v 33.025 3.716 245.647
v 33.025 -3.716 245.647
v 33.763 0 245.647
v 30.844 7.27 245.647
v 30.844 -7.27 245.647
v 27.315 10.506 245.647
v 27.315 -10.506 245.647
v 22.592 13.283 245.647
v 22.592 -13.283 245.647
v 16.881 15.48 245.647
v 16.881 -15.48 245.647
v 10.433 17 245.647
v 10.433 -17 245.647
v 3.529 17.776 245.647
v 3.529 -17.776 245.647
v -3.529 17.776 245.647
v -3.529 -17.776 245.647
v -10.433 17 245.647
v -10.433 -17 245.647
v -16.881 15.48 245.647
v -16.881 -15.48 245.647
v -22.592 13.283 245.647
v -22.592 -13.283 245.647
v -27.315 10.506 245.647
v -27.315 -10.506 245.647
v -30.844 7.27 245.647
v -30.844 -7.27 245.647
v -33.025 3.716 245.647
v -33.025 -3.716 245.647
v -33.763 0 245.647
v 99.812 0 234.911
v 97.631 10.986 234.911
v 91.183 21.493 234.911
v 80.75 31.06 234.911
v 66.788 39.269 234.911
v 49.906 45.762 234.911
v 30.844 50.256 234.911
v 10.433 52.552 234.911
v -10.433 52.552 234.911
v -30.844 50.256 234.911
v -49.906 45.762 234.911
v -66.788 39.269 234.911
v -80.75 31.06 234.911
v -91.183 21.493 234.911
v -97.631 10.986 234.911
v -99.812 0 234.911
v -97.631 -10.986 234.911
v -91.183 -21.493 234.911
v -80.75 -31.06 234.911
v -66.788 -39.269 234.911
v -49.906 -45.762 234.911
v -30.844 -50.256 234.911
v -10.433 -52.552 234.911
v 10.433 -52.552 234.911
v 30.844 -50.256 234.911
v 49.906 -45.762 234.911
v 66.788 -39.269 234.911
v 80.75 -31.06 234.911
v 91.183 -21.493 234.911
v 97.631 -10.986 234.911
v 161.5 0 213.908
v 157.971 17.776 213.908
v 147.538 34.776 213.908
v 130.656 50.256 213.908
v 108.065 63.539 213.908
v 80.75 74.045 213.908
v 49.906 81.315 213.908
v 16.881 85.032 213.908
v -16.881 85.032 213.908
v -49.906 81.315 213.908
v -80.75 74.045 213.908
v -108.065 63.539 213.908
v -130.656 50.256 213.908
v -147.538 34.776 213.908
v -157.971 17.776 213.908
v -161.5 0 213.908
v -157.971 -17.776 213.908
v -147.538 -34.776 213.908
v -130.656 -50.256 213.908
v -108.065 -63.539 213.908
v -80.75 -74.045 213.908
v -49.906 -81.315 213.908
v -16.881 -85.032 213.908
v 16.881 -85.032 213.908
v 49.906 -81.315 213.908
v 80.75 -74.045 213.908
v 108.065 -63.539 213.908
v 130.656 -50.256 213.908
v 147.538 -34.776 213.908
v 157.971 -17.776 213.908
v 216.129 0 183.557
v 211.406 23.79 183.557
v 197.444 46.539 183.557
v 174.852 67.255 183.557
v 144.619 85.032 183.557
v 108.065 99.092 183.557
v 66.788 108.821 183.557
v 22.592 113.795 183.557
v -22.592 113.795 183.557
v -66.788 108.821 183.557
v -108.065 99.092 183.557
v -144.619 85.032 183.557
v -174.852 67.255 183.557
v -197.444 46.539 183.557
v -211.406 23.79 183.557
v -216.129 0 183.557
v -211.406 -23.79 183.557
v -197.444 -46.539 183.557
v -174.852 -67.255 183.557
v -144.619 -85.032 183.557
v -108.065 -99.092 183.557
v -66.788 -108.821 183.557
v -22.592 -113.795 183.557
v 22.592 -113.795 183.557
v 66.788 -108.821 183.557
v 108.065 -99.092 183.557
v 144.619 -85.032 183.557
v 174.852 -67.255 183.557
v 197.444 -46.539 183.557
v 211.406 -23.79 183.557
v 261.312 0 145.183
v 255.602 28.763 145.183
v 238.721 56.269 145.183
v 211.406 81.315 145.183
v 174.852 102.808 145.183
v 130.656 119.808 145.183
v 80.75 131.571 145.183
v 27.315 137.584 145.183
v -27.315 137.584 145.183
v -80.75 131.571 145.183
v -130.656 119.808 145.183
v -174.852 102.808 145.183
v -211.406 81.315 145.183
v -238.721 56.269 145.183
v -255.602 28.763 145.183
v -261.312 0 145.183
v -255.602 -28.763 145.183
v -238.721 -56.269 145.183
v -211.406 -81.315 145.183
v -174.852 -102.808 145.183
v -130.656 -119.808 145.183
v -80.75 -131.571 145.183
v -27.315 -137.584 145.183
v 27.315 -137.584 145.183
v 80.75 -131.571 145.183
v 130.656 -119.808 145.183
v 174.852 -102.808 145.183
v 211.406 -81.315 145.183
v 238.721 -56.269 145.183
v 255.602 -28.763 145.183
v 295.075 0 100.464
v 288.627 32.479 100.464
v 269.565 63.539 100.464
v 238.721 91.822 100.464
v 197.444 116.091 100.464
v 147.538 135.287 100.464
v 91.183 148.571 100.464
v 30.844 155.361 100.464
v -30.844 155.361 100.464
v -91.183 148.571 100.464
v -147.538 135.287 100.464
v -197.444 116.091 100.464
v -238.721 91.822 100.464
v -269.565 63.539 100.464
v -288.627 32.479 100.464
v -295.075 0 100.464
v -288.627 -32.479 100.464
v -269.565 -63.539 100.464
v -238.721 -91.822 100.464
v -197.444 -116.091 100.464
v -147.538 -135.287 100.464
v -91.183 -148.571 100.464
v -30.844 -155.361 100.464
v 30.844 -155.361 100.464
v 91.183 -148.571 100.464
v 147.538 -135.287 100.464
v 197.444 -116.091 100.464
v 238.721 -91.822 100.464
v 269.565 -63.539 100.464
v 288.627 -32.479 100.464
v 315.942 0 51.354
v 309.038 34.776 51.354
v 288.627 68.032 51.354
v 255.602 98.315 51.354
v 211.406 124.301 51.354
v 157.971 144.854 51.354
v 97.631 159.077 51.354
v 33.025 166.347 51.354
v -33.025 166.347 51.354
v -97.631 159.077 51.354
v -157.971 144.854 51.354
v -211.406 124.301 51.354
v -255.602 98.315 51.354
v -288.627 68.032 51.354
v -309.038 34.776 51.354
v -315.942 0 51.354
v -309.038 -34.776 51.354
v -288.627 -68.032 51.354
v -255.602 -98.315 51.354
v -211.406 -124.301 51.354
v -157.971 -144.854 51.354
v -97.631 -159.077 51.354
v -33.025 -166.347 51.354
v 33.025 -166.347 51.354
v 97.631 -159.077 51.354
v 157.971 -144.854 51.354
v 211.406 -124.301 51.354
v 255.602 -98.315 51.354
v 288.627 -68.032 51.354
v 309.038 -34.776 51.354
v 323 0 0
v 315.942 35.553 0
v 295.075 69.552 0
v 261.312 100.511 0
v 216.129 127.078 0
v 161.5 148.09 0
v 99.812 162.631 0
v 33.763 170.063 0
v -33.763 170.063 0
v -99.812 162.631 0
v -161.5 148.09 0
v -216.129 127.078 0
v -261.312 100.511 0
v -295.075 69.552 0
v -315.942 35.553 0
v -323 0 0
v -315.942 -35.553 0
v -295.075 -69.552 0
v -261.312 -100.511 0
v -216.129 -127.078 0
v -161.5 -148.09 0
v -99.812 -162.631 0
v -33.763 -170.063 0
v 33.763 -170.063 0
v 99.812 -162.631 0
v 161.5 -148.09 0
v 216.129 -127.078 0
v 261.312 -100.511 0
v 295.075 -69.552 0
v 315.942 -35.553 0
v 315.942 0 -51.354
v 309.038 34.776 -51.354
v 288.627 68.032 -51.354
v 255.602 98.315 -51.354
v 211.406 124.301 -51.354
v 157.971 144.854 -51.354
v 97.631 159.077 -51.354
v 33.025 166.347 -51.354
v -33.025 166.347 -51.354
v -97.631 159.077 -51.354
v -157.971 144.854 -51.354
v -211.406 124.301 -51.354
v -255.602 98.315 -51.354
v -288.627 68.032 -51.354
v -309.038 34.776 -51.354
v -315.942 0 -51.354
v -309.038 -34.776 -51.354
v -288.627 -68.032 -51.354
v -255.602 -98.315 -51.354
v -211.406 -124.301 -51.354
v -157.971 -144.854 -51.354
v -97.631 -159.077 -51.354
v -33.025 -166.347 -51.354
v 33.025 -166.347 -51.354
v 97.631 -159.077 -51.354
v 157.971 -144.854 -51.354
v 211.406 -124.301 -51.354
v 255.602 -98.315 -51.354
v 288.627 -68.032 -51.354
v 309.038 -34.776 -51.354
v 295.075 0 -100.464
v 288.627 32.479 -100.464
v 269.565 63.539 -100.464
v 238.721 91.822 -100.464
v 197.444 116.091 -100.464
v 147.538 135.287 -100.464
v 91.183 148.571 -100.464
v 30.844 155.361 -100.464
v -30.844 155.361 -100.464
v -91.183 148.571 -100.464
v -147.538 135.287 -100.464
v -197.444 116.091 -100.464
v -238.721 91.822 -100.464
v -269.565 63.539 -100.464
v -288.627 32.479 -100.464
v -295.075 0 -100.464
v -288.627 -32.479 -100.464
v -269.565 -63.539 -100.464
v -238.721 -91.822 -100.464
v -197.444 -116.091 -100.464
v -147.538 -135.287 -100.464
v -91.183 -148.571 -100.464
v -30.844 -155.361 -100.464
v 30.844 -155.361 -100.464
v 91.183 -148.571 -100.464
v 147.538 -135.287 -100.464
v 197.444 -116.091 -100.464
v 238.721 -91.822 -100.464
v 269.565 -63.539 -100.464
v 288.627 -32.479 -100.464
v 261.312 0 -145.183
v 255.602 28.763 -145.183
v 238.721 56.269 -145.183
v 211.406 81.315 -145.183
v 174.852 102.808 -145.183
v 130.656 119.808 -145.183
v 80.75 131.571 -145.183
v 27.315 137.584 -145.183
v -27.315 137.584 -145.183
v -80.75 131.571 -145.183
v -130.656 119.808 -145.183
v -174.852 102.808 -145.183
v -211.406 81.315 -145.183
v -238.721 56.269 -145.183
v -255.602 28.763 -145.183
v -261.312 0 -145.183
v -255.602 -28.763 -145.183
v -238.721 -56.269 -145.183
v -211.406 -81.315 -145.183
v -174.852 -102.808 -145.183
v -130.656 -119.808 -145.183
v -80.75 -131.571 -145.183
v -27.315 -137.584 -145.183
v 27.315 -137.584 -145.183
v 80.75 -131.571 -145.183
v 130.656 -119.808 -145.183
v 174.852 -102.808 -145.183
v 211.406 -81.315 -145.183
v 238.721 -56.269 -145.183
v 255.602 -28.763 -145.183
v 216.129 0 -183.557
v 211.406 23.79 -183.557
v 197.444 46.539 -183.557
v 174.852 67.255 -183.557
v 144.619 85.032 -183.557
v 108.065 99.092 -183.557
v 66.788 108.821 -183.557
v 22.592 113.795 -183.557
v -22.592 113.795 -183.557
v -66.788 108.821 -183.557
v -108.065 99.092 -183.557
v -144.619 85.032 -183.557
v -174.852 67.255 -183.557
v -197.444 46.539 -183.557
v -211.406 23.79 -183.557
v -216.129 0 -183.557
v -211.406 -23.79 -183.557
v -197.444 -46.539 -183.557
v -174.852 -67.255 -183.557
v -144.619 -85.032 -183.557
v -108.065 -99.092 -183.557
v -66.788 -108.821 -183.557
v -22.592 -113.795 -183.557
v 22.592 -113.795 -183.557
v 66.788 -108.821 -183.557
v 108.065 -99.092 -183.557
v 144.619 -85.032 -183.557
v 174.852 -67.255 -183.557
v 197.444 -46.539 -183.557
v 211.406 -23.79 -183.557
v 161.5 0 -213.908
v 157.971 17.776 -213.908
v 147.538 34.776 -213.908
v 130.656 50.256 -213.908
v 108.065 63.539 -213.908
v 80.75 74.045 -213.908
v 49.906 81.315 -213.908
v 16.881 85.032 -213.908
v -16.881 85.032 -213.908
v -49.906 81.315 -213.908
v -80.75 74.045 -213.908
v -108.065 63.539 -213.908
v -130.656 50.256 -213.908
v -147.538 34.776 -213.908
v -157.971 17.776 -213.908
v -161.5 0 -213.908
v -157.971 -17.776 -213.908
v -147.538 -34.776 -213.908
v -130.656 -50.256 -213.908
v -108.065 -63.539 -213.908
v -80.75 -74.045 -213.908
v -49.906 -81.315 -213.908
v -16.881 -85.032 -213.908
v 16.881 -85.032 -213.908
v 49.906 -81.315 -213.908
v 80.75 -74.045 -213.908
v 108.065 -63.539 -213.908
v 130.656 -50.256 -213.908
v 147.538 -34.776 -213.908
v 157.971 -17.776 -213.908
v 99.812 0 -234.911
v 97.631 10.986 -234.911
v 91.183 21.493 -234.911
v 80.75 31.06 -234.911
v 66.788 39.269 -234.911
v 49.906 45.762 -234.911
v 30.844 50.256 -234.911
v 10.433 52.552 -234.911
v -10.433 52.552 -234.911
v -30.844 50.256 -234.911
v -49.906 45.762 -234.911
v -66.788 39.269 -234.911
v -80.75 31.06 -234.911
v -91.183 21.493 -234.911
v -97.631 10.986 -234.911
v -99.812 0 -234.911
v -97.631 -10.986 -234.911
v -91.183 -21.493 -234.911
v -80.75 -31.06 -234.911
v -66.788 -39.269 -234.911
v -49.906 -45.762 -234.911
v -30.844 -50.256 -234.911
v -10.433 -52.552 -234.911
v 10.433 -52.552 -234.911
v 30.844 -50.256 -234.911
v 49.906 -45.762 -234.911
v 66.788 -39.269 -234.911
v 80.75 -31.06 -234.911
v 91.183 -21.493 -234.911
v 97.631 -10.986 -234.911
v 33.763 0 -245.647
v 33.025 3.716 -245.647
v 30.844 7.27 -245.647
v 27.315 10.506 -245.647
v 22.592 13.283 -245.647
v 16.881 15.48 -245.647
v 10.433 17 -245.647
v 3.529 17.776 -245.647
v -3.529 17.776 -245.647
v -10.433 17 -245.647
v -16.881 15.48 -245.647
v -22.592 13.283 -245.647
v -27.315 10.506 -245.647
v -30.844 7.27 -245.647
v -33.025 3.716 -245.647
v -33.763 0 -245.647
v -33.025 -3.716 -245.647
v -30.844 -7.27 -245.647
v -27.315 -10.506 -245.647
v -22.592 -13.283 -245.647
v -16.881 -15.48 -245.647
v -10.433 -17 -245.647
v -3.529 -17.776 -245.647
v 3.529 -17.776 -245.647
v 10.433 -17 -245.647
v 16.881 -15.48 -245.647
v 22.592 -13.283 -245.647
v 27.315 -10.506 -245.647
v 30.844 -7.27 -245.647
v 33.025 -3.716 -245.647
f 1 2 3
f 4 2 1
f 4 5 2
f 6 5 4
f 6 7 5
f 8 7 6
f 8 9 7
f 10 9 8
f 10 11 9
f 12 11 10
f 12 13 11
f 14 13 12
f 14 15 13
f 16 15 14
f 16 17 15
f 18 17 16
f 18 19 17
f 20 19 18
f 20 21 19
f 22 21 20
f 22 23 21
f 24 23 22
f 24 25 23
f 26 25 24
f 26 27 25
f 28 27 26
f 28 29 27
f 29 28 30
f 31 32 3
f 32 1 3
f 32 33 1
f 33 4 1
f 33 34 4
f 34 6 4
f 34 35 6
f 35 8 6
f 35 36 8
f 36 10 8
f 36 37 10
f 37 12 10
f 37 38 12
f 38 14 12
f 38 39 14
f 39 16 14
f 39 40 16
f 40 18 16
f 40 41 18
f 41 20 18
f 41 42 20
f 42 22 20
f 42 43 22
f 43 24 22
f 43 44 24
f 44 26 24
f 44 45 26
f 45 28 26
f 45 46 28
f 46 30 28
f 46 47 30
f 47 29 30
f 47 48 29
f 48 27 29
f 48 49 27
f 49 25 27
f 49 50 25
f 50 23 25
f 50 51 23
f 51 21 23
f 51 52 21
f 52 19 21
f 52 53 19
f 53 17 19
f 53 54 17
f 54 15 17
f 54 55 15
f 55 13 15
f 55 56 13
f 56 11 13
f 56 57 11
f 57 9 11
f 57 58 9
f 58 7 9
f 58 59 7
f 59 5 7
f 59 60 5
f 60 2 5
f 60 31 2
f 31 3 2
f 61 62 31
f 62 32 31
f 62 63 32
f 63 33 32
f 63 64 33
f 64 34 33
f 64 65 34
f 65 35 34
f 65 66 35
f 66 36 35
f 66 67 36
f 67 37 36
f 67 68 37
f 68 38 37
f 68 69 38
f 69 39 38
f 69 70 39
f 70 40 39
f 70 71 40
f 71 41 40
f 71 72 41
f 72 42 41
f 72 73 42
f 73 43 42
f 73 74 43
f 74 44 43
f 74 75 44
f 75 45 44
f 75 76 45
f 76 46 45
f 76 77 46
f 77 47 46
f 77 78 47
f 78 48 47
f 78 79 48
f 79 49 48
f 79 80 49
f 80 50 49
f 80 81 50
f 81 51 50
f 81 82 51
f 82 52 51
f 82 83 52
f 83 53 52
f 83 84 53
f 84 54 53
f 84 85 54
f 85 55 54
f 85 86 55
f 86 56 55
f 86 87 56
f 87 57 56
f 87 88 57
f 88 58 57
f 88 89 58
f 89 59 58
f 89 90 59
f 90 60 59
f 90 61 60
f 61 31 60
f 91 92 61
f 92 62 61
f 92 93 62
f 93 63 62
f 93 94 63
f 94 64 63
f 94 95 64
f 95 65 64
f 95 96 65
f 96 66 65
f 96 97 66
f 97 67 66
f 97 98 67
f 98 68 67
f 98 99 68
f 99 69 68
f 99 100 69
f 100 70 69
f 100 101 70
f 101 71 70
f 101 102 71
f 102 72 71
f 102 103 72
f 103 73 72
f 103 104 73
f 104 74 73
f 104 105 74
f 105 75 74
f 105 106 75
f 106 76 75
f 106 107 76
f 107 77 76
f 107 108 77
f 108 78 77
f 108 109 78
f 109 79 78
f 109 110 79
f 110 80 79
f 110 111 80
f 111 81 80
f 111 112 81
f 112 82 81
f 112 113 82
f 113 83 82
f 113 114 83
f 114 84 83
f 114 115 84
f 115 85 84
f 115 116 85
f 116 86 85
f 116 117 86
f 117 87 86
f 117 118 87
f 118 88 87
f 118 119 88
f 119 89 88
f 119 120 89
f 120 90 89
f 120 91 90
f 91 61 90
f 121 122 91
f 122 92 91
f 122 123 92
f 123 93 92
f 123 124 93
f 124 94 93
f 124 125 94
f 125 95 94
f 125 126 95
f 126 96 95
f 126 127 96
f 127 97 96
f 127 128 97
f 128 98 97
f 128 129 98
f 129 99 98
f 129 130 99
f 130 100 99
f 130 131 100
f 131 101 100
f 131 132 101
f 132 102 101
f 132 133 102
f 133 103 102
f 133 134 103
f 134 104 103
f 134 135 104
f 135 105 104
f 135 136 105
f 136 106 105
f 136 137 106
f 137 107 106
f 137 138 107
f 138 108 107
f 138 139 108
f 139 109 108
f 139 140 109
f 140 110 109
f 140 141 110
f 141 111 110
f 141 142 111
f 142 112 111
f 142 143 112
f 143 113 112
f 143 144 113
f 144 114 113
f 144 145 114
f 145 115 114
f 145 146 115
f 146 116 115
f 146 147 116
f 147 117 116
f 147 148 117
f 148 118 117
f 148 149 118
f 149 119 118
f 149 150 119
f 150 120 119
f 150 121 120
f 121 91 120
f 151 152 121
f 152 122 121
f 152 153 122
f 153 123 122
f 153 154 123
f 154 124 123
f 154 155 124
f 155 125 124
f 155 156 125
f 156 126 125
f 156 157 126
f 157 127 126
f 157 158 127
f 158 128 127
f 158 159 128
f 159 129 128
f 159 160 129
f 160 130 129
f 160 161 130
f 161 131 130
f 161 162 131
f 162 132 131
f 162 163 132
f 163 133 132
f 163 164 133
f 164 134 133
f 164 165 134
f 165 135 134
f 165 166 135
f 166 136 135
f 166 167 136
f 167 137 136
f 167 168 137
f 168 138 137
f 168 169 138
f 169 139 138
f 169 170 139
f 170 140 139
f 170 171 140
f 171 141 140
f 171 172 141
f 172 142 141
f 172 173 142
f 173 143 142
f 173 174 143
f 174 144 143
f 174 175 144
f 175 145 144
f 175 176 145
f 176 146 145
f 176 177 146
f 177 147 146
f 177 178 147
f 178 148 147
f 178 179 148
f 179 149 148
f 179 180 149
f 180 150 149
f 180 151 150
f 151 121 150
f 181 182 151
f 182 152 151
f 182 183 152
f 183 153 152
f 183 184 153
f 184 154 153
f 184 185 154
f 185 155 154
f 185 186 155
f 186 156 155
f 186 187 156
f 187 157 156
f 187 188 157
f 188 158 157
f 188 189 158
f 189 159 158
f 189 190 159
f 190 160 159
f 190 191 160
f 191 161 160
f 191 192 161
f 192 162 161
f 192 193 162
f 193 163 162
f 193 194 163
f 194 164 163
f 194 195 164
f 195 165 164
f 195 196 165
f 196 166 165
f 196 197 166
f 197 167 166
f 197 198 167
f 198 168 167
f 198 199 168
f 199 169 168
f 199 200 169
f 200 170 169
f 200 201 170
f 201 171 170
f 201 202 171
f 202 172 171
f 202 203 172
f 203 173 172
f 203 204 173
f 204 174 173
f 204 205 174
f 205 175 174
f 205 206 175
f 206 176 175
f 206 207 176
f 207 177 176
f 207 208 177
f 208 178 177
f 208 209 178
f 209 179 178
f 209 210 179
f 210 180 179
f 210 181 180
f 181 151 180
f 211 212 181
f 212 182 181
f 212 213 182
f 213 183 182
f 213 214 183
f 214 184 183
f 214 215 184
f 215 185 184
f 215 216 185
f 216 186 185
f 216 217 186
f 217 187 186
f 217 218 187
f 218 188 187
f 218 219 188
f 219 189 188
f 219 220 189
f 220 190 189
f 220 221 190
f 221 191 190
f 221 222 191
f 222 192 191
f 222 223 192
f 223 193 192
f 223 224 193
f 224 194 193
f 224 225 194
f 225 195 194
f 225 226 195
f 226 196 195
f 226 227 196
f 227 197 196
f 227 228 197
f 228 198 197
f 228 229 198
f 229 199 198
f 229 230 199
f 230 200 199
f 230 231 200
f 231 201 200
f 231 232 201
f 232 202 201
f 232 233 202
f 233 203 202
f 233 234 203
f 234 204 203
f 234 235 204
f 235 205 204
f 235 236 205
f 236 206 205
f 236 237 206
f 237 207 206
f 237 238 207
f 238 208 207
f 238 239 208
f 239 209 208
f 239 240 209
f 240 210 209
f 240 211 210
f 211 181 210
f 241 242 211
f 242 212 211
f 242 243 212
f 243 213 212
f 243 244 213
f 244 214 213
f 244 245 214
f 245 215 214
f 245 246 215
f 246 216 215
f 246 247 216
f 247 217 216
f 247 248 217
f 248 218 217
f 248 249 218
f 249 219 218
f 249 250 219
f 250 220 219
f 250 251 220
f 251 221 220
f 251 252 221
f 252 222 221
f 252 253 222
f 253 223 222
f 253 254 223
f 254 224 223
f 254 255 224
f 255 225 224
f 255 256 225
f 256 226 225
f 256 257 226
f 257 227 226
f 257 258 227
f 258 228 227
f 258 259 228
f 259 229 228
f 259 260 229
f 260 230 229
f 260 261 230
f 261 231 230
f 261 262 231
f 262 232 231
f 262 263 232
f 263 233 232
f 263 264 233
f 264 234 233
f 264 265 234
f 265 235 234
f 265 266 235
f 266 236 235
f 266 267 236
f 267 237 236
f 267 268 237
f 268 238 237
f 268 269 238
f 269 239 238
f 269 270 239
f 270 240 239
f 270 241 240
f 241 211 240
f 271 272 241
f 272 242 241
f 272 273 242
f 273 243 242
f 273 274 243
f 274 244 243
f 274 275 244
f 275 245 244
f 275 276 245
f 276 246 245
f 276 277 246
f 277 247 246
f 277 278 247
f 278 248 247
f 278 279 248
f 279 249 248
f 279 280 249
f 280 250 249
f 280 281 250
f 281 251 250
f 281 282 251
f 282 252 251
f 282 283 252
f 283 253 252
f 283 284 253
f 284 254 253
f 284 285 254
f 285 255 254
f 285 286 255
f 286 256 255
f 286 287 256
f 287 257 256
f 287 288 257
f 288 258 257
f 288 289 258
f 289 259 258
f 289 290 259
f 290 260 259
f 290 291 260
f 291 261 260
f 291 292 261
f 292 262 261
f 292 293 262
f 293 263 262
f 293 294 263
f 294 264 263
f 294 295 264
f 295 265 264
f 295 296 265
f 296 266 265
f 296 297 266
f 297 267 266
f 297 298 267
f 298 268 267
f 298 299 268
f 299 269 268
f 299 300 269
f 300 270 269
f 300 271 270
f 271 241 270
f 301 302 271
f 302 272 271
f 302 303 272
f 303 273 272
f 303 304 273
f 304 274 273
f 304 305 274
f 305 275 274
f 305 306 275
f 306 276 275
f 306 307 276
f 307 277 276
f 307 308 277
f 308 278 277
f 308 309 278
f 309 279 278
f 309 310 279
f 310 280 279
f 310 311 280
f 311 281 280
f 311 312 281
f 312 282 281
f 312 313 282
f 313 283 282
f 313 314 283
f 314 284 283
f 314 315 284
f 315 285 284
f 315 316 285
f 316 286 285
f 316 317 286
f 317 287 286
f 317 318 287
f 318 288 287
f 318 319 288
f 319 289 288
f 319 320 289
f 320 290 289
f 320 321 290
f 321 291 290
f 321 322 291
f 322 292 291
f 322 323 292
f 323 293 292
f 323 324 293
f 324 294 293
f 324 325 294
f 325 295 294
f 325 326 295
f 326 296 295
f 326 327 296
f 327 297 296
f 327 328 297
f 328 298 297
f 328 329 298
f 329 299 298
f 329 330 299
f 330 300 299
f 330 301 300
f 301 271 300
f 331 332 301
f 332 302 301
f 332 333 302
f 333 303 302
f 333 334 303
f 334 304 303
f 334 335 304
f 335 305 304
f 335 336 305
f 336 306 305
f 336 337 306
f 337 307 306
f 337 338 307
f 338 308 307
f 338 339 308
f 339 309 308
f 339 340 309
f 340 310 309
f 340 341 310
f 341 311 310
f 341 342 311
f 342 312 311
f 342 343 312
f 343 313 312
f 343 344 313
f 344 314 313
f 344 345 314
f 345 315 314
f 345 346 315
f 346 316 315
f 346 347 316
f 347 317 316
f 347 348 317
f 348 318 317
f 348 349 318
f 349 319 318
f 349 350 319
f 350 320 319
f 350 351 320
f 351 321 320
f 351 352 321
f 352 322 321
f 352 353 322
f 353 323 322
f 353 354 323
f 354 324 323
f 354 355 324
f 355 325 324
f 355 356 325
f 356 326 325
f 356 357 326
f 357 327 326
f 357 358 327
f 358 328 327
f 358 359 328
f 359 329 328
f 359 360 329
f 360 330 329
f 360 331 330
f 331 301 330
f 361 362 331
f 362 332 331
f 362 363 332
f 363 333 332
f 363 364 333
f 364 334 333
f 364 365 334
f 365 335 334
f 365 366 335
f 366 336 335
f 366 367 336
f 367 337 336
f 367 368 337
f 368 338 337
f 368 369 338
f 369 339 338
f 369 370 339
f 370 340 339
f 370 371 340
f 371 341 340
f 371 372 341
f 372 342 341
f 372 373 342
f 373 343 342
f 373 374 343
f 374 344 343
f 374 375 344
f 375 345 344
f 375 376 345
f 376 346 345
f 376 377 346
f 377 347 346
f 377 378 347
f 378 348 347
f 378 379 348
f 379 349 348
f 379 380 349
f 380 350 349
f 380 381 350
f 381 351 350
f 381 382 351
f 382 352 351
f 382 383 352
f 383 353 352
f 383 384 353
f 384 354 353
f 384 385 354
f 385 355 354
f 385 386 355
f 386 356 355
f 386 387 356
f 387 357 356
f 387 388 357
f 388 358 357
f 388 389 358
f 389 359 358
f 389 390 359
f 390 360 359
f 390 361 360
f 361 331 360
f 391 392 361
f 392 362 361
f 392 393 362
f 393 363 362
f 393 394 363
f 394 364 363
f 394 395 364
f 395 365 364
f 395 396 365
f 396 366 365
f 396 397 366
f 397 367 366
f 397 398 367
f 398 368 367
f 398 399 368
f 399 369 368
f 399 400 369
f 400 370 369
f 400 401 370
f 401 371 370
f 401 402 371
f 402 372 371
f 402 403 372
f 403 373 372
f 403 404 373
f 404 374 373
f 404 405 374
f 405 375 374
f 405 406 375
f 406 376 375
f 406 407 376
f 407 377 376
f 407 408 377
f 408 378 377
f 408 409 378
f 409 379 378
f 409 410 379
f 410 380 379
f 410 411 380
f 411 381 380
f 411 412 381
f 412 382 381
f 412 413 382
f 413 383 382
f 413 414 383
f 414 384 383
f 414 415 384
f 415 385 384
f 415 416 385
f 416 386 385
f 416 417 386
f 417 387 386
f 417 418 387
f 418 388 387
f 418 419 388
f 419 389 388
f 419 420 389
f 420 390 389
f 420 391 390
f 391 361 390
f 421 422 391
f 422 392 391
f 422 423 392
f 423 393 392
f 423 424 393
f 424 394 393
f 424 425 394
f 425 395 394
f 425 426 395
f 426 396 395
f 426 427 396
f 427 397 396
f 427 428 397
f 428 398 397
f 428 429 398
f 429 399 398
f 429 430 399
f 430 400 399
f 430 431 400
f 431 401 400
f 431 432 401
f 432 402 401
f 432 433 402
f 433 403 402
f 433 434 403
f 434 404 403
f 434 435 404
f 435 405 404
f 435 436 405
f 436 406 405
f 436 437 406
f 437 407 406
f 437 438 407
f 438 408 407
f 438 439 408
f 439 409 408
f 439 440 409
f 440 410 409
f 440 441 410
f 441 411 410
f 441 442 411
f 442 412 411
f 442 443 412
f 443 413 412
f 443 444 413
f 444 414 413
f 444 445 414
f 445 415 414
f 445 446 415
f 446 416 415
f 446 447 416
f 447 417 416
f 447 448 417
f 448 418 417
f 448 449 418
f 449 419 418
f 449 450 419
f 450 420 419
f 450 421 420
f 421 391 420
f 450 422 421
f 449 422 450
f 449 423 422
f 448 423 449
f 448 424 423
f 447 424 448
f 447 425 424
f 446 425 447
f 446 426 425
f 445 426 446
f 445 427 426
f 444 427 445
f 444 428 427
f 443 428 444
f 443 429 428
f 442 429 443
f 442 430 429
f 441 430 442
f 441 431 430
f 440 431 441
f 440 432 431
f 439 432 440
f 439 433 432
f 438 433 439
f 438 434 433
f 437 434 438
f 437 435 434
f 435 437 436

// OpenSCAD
// Generated by SolidPython 1.0.1 on 2020-07-29 00:46:53


scale(v = [17, 9, 13]) {
	sphere(r = 19);
}
/***********************************************
*********      SolidPython code:      **********
************************************************
 
# import packages: SolidPython
from solid import *
from solid.utils import *
from itertools import chain, combinations, permutations


class Resize:

    def __init__(self, scad_file):
        self.scad_file = scad_file
        #self.scad_file = import_scad(scad_file)
        # cone/cylinder param:
        self.r1 = 0
        self.r2 = 0
        self.h = 0
        # rectangular prism param:
        self.w = 0
        self.l = 0
        # ellipse param:
        self.r = 0

    # import OpenScad code (file name corresponds to shape)


    # classify shape + parameters
    def assign(self, param1, param2, param3):
        if self.scad_file == 'cone.scad':
            self.r1 = param1
            self.r2 = param2
            self.h = param3
        elif self.scad_file == 'cylinder.scad':
            self.r1 = param1
            self.r2 = param2
            self.h = param3
        elif self.scad_file == 'rectangularPrism.scad':
            self.h = param1
            self.l = param2
            self.w = param3
        else:
            self.r = param1
            self.h = param2

    # resize parameters
    def iterate(self):
        x = range(3, 20, 2)
        i = 1
        if self.scad_file == 'cone.scad':
            tempList = list(permutations(x, 2))
            for temp in tempList:
                param1 = temp[0]
                param2 = temp[1]
                filepath = 'produced_scad_files/' + 'cone' + str(param1) + '_' + str(param2) + '_' + '.scad'
                scad_render_to_file(cylinder(h=param1, r1=param2, r2=0), filepath)

        elif self.scad_file == 'cylinder.scad':
            tempList = list(permutations(x, 3))
            for temp in tempList:
                param1 = temp[0]
                param2 = temp[1]
                filepath = 'produced_scad_files/' + 'cylinder' + str(param1) + '_' + str(param2) + '_' + '.scad'
                scad_render_to_file(cylinder(h=param1, r1=param2, r2=param2), filepath)

        elif self.scad_file == 'rectangularPrism.scad':
            tempList = list(permutations(x, 3))
            for temp in tempList:
                param1 = temp[0]
                param2 = temp[1]
                param3 = temp[2]
                filepath = 'produced_scad_files/' + 'rectangularPrism' + str(param1) + '_' + str(param2) + '_' + str(
                    param3) + '.scad'
                scad_render_to_file(cube(size=(param1, param2, param3)), filepath)

        elif self.scad_file == 'ellipse.scad':
            tempList = list(permutations(x, 4))
            for temp in tempList:
                param1 = temp[0]
                param2 = temp[1]
                param3 = temp[2]
                param4 = temp[3]
                filepath = 'produced_scad_files/' + 'ellipse' + str(param1) + '_' + str(param2) + '_' + str(param3) + '_' + str(param4) + '.scad'
                scad_render_to_file(scale([param1, param2, param3])(sphere(r=param4)), filepath)

    def render_to_scadfile(self):
        scad_render_to_file(scad, 'example.scad') 
 
************************************************/
